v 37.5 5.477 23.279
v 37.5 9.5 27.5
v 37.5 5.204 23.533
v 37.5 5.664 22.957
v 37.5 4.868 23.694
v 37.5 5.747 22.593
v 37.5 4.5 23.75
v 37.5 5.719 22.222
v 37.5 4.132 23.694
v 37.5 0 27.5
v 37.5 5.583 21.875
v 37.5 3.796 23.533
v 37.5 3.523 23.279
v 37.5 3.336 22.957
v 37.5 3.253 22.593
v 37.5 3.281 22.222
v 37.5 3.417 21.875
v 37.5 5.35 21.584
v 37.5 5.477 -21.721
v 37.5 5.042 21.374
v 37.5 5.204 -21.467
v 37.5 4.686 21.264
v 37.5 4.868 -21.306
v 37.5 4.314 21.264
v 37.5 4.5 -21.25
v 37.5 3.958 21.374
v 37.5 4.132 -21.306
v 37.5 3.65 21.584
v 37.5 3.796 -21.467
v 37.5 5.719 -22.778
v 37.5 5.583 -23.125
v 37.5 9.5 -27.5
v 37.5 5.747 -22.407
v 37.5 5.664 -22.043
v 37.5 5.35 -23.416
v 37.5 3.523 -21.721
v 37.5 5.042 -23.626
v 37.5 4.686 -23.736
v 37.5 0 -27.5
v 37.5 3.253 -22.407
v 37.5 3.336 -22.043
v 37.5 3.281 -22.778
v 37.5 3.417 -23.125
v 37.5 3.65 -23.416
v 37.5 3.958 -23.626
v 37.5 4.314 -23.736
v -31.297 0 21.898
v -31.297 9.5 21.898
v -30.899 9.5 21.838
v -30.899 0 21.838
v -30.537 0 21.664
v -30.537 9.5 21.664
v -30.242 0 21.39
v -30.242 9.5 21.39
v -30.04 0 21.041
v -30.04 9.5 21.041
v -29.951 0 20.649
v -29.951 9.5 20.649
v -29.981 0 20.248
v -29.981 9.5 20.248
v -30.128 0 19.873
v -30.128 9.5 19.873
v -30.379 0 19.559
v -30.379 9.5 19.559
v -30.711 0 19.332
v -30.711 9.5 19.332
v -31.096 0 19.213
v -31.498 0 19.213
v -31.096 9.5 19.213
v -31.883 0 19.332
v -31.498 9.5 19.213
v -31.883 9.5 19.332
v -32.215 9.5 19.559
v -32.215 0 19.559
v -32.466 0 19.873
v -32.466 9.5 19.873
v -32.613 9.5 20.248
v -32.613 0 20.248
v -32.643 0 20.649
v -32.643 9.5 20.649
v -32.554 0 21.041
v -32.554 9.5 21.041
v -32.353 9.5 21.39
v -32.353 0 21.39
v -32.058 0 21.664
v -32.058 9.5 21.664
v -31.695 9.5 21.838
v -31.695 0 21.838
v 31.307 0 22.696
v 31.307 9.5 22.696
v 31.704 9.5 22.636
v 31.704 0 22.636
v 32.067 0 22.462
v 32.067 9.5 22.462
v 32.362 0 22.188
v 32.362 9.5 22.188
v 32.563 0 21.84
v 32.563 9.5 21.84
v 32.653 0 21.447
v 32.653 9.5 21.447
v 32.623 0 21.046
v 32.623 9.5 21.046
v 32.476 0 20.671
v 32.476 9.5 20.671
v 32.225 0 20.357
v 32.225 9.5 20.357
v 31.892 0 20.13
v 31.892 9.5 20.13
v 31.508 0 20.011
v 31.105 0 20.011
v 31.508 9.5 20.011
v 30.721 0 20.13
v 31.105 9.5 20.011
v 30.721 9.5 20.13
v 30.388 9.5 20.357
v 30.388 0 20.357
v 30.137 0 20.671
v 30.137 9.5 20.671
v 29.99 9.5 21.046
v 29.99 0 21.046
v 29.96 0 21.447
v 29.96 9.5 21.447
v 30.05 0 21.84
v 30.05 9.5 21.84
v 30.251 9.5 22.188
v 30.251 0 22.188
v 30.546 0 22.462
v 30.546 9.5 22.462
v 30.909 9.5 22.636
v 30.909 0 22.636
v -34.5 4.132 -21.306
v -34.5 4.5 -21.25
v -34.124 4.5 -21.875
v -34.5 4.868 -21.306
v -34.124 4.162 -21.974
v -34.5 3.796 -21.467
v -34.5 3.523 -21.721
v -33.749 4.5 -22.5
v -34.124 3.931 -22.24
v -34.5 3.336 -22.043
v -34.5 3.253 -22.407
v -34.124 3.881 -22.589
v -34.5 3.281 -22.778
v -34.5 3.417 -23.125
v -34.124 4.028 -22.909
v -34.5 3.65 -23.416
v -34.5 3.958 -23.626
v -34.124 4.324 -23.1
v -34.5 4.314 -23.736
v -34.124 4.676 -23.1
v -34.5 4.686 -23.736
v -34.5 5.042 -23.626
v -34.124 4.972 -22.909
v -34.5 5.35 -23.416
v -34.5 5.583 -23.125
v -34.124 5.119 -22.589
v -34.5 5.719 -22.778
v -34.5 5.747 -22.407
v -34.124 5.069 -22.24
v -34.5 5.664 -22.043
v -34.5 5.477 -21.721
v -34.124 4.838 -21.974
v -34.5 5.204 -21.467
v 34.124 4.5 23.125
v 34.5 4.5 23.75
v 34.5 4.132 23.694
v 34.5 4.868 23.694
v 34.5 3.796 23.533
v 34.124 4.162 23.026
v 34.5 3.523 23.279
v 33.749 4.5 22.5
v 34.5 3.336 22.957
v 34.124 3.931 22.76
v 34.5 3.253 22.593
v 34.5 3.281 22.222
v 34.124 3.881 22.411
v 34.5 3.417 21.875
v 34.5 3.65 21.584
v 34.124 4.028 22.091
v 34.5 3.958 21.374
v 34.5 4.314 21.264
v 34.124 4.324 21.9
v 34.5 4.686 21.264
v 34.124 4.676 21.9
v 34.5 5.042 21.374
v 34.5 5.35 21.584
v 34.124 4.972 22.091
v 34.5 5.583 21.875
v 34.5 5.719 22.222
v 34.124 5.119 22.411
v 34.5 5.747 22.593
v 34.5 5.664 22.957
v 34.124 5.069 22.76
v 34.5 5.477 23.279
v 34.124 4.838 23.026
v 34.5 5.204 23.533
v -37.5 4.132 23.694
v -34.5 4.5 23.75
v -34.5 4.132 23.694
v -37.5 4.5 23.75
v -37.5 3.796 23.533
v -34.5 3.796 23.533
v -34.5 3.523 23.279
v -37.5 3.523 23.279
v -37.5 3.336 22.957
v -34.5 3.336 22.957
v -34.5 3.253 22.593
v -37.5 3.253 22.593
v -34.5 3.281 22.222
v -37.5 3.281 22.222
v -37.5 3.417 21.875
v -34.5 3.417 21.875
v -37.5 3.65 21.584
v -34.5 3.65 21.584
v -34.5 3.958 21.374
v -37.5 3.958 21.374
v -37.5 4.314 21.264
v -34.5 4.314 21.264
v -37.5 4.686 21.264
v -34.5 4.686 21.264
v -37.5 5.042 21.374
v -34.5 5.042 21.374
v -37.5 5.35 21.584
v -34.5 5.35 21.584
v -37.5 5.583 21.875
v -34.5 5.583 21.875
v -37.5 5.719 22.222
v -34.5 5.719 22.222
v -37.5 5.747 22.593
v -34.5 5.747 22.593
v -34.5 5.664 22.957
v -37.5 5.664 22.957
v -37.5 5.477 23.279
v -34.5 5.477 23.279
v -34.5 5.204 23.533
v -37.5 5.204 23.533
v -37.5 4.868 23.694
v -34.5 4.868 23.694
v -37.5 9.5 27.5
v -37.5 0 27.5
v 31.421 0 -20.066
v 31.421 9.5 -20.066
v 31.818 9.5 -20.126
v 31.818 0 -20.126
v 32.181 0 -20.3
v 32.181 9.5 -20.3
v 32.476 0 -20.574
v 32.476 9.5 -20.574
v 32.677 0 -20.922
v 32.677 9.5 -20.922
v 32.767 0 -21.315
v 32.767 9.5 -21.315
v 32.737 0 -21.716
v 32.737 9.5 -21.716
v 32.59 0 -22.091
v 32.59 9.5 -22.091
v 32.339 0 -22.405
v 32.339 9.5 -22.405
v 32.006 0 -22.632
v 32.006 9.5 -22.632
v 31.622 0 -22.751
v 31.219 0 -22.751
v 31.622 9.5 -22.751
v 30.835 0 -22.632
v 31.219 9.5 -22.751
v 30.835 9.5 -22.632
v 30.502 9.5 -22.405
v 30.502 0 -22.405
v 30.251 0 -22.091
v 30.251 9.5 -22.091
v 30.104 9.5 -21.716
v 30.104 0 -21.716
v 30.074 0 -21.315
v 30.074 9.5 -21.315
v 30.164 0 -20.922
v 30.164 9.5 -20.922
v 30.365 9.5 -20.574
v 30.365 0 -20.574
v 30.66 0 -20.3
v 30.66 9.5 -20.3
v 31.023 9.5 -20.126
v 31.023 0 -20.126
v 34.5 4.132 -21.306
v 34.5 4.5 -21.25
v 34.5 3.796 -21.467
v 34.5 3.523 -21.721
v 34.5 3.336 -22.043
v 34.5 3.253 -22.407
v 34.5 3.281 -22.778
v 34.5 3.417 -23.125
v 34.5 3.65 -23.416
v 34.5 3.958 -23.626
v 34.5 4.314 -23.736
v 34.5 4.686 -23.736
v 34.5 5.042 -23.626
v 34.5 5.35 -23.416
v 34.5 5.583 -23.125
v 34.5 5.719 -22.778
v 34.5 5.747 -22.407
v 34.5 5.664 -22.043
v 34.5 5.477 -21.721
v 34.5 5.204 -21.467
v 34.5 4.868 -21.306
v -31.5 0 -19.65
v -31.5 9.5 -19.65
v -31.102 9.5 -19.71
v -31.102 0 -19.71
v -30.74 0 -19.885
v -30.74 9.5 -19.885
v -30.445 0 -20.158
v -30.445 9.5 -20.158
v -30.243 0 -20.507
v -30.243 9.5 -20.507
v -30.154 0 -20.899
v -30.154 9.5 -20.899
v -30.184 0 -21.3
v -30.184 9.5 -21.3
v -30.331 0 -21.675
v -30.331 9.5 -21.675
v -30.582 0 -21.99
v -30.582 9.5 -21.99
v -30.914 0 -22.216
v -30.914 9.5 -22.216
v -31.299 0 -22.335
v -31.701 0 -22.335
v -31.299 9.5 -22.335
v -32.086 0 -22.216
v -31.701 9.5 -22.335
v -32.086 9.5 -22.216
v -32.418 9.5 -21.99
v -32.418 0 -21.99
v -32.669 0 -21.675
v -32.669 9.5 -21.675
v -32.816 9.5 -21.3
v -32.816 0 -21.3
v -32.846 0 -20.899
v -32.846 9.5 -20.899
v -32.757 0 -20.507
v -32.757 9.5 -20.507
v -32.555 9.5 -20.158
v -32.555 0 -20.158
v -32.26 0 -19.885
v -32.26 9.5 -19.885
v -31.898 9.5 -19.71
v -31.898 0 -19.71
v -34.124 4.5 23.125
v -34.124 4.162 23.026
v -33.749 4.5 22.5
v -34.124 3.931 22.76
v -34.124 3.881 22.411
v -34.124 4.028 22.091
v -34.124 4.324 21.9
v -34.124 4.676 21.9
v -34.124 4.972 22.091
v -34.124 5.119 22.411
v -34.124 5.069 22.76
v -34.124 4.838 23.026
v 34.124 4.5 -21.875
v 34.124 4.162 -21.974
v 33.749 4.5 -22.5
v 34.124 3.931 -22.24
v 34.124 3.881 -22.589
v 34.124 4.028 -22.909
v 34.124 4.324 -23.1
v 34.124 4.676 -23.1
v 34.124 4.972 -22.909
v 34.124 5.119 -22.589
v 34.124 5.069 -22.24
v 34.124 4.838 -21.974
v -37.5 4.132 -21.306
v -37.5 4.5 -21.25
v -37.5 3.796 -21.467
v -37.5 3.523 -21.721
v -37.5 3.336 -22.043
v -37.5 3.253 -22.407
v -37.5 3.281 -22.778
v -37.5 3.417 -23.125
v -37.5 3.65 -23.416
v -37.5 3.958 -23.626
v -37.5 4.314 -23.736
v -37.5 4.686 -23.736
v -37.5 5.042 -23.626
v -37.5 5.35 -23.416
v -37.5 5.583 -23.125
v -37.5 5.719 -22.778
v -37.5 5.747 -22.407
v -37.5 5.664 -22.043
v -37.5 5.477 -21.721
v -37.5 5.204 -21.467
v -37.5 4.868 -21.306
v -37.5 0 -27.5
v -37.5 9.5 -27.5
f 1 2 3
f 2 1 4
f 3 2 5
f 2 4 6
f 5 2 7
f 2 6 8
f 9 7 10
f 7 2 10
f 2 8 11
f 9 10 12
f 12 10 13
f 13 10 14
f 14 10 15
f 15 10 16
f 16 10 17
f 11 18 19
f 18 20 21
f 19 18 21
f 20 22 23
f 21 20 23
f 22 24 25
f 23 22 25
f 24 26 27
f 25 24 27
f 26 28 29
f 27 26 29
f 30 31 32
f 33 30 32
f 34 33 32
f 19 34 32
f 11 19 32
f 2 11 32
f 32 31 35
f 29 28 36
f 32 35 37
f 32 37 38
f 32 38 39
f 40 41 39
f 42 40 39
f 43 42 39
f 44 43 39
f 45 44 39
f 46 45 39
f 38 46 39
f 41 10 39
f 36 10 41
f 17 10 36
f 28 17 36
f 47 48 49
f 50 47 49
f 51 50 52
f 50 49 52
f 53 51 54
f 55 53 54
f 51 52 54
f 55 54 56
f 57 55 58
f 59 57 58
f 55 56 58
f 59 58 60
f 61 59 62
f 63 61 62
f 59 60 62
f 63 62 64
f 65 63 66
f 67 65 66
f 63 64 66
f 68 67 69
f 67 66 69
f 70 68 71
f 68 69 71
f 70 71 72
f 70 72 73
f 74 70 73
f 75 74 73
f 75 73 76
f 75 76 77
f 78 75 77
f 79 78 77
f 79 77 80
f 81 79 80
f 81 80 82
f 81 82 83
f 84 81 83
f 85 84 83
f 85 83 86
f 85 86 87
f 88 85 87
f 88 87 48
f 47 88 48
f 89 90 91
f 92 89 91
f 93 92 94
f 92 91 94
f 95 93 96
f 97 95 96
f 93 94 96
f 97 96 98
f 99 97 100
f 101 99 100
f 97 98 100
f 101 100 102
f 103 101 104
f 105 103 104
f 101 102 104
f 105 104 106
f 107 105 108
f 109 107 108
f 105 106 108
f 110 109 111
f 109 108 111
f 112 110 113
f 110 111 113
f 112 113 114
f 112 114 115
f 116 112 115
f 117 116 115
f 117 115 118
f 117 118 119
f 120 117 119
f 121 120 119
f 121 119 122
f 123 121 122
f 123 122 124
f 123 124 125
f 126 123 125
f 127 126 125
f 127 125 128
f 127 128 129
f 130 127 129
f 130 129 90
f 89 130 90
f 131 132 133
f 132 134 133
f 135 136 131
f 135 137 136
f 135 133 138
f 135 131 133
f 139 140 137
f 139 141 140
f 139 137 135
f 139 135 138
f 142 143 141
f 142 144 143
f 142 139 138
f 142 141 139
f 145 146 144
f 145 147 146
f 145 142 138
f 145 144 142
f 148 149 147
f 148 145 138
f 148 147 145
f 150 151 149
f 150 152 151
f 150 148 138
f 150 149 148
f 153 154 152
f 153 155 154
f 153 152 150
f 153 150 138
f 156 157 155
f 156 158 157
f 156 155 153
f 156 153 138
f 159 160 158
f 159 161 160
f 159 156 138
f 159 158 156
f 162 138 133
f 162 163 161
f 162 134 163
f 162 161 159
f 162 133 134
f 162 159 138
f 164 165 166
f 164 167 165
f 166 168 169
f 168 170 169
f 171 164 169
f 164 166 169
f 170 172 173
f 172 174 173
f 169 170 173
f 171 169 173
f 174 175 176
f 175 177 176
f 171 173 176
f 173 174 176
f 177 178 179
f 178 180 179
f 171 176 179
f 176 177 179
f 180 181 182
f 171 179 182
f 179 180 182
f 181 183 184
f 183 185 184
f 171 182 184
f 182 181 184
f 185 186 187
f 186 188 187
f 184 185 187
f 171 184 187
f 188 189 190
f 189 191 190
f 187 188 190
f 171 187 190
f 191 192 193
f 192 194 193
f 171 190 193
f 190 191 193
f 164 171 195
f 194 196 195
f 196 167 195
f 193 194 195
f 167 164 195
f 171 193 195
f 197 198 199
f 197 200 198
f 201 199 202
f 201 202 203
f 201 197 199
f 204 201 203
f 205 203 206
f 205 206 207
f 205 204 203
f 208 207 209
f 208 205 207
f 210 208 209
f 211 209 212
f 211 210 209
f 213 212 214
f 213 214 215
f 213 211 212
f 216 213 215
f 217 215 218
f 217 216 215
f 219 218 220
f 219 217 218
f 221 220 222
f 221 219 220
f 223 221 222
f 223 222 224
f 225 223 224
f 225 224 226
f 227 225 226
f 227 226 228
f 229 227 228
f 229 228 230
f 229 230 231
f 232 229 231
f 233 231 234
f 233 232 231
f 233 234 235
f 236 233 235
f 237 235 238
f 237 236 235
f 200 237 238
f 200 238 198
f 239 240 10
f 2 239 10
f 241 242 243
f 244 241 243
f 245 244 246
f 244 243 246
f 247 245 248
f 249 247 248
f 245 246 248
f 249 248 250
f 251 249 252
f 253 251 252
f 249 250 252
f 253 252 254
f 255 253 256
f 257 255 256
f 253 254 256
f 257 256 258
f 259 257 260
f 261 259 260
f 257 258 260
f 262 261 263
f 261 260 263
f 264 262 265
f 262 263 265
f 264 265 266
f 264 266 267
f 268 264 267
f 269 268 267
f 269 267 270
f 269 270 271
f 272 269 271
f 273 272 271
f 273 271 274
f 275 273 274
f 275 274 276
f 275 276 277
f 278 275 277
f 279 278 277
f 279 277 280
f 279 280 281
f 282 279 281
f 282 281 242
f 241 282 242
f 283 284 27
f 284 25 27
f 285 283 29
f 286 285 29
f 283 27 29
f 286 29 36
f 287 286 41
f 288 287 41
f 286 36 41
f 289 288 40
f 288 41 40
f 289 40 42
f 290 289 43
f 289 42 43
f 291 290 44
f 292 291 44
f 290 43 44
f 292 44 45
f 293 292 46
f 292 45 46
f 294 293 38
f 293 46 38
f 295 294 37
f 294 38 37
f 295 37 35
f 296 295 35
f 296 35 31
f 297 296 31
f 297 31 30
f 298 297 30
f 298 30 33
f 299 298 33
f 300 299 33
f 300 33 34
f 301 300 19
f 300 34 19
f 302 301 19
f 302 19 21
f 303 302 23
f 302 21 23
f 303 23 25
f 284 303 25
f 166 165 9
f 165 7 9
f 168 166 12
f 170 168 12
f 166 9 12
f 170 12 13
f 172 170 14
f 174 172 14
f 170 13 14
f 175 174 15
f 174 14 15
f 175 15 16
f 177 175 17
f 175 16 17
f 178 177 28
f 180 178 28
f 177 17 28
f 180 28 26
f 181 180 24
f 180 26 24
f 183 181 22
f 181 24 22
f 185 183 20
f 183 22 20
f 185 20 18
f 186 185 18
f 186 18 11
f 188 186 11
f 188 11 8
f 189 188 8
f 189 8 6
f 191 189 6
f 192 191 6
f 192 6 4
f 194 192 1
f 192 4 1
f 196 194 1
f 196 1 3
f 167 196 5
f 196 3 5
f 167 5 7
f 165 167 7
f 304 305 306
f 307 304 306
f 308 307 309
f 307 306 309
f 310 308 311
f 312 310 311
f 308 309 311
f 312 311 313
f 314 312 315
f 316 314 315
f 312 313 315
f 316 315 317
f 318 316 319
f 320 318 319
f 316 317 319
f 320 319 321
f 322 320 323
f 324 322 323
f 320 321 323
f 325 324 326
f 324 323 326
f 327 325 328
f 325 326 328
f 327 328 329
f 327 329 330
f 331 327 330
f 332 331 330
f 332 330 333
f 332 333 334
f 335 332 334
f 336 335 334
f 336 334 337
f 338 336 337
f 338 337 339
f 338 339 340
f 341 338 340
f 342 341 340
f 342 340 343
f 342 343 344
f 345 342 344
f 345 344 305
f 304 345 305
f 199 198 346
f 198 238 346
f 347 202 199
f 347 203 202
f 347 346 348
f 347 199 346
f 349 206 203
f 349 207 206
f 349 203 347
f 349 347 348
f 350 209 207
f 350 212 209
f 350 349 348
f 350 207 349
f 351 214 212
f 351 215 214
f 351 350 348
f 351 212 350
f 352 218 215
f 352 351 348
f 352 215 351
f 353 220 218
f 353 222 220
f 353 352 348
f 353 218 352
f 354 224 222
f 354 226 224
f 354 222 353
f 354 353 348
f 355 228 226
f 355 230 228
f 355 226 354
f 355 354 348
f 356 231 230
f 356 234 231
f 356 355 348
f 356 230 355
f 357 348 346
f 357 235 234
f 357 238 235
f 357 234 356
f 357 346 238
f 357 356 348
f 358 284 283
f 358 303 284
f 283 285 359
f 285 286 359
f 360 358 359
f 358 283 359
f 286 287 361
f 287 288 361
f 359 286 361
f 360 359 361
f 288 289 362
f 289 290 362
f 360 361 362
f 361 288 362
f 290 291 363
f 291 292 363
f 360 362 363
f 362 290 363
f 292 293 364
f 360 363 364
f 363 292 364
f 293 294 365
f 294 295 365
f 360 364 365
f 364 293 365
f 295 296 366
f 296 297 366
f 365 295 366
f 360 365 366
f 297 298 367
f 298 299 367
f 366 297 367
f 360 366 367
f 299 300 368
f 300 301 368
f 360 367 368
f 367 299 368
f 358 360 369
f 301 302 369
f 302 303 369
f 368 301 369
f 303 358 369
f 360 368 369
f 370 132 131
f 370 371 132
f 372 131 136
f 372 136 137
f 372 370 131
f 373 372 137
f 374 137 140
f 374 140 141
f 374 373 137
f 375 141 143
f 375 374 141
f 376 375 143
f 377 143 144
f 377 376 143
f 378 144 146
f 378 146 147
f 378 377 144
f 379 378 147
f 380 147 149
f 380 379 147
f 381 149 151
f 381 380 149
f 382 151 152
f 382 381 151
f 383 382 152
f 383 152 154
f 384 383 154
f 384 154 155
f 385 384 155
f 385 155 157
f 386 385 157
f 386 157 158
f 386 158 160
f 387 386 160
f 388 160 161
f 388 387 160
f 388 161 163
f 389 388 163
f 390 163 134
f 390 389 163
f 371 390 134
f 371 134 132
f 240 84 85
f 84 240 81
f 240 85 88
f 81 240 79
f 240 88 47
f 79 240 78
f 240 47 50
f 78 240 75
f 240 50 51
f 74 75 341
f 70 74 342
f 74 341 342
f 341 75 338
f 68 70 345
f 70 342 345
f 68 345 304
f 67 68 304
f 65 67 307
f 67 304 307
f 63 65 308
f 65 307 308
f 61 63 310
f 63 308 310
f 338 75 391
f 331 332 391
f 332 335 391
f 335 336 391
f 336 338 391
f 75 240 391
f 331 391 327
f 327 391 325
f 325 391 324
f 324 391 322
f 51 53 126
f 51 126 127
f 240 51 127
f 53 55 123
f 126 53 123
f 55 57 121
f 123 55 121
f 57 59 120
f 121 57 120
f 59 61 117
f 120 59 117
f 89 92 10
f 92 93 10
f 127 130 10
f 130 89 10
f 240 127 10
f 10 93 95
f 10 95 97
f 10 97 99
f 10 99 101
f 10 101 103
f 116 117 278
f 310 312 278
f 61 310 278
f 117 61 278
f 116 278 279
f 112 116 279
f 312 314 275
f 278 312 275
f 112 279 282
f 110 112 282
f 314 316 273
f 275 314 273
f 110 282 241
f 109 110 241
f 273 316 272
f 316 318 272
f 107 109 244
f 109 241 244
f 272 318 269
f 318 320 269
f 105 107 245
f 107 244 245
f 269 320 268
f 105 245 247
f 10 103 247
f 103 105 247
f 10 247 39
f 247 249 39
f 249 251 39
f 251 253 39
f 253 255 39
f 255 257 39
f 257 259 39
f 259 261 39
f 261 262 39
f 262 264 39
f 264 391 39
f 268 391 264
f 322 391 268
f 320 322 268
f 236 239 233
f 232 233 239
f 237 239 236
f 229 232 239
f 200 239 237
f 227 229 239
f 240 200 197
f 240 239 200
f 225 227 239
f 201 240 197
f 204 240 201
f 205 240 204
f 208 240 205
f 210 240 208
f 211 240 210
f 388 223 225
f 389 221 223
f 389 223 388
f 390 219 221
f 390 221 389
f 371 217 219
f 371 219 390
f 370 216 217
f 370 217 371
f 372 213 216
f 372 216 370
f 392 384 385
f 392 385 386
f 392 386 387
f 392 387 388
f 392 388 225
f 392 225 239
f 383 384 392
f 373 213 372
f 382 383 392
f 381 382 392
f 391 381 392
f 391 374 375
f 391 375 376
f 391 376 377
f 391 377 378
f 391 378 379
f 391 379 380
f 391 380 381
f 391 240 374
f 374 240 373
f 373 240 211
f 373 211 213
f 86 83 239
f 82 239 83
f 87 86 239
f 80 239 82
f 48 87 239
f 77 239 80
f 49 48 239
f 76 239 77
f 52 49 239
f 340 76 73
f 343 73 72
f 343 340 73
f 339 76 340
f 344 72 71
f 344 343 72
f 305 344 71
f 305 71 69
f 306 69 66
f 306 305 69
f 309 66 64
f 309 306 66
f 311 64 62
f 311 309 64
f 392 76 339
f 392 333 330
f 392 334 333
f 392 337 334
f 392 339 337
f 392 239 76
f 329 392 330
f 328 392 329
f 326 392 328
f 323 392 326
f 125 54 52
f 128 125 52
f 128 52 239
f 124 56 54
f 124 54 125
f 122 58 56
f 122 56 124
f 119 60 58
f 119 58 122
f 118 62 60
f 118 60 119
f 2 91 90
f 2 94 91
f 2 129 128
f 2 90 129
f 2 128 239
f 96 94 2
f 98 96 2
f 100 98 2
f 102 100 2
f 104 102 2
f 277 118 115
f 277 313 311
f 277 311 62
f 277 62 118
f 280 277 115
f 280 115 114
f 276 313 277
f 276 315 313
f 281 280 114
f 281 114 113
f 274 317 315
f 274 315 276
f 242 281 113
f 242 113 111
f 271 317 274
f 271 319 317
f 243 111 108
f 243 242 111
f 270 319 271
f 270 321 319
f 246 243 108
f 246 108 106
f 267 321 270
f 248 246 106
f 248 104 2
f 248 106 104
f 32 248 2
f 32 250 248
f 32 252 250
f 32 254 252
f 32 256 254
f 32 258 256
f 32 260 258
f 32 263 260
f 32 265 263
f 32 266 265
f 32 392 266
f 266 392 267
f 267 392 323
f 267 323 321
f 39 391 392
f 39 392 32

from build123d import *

# Parameters (mm, degrees)
SKETCH1_W                      = 75
SKETCH1_H                      = 55
BOSS_EXTRUDE1_DEPTH            = 9.5
SKETCH2_R                      = 1.35
CUT_EXTRUDE1_DEPTH             = 10
M3X0_5_TAPPED_HOLE2_AT_2_COUNT = 2
M3X0_5_TAPPED_HOLE2_AT_2_PITCH = 45


with BuildPart() as part:
    # Sketch1 → Boss-Extrude1 (new body)
    with BuildSketch(Plane(origin=(0, 0, 0), x_dir=(1, 0, 0), z_dir=(0, 1, 0))):
        Rectangle(SKETCH1_W, SKETCH1_H)
    extrude(amount=BOSS_EXTRUDE1_DEPTH)

    # Sketch2 → Cut-Extrude1 (cut)
    with BuildSketch(Plane(origin=(0, 9.5, 0), x_dir=(1, 0, 0), z_dir=(0, 1, 0))):
        with Locations(Location((-31.5, 21, 0), (0, 0, 270))):
            Circle(SKETCH2_R)
        with Locations(Location((31.420574921, 21.415697585, 0), (0, 0, 270))):
            Circle(SKETCH2_R)
        with Locations(Location((31.306542661, -21.346400068, 0), (0, 0, 270))):
            Circle(SKETCH2_R)
        with Locations(Location((-31.297168302, -20.548174245, 0), (0, 0, 270))):
            Circle(SKETCH2_R)
    extrude(amount=-CUT_EXTRUDE1_DEPTH, mode=Mode.SUBTRACT)

    # Sketch5 → M3x0.5 Tapped Hole2 (revolve, cut)
    with BuildSketch(Plane(origin=(-37.5, 4.5, -22.5), x_dir=(0, 0, 1), z_dir=(0, 1, 0))):
        Polygon((0, 0), (0, 3.751075774), (1.25, 3), (1.25, 0), align=None)
    m3x0_5_tapped_hole2 = revolve(axis=Axis((-43.85, 4.5, -22.5), (1, 0, 0)), mode=Mode.SUBTRACT)

    # M3x0.5 Tapped Hole2 at 2: M3x0.5 Tapped Hole2 ×2
    with Locations(*[(0, 0, i * M3X0_5_TAPPED_HOLE2_AT_2_PITCH) for i in range(1, M3X0_5_TAPPED_HOLE2_AT_2_COUNT)]):
        add(m3x0_5_tapped_hole2, mode=Mode.SUBTRACT)

    # Mirror1: M3x0.5 Tapped Hole2 across plane
    add(m3x0_5_tapped_hole2.mirror(Plane.ZY), mode=Mode.SUBTRACT)

    # Mirror1 copy 1 sketch → Mirror1 copy 1 (revolve, cut)
    with BuildSketch(Plane(origin=(37.5, 4.5, 22.5), x_dir=(0, 0, 1), z_dir=(0, 1, 0))):
        Polygon((0, 0), (0, -3.751075774), (1.25, -3), (1.25, 0), align=None)
    revolve(axis=Axis((43.85, 4.5, 22.5), (1, 0, 0)), mode=Mode.SUBTRACT)


solid = part.part
